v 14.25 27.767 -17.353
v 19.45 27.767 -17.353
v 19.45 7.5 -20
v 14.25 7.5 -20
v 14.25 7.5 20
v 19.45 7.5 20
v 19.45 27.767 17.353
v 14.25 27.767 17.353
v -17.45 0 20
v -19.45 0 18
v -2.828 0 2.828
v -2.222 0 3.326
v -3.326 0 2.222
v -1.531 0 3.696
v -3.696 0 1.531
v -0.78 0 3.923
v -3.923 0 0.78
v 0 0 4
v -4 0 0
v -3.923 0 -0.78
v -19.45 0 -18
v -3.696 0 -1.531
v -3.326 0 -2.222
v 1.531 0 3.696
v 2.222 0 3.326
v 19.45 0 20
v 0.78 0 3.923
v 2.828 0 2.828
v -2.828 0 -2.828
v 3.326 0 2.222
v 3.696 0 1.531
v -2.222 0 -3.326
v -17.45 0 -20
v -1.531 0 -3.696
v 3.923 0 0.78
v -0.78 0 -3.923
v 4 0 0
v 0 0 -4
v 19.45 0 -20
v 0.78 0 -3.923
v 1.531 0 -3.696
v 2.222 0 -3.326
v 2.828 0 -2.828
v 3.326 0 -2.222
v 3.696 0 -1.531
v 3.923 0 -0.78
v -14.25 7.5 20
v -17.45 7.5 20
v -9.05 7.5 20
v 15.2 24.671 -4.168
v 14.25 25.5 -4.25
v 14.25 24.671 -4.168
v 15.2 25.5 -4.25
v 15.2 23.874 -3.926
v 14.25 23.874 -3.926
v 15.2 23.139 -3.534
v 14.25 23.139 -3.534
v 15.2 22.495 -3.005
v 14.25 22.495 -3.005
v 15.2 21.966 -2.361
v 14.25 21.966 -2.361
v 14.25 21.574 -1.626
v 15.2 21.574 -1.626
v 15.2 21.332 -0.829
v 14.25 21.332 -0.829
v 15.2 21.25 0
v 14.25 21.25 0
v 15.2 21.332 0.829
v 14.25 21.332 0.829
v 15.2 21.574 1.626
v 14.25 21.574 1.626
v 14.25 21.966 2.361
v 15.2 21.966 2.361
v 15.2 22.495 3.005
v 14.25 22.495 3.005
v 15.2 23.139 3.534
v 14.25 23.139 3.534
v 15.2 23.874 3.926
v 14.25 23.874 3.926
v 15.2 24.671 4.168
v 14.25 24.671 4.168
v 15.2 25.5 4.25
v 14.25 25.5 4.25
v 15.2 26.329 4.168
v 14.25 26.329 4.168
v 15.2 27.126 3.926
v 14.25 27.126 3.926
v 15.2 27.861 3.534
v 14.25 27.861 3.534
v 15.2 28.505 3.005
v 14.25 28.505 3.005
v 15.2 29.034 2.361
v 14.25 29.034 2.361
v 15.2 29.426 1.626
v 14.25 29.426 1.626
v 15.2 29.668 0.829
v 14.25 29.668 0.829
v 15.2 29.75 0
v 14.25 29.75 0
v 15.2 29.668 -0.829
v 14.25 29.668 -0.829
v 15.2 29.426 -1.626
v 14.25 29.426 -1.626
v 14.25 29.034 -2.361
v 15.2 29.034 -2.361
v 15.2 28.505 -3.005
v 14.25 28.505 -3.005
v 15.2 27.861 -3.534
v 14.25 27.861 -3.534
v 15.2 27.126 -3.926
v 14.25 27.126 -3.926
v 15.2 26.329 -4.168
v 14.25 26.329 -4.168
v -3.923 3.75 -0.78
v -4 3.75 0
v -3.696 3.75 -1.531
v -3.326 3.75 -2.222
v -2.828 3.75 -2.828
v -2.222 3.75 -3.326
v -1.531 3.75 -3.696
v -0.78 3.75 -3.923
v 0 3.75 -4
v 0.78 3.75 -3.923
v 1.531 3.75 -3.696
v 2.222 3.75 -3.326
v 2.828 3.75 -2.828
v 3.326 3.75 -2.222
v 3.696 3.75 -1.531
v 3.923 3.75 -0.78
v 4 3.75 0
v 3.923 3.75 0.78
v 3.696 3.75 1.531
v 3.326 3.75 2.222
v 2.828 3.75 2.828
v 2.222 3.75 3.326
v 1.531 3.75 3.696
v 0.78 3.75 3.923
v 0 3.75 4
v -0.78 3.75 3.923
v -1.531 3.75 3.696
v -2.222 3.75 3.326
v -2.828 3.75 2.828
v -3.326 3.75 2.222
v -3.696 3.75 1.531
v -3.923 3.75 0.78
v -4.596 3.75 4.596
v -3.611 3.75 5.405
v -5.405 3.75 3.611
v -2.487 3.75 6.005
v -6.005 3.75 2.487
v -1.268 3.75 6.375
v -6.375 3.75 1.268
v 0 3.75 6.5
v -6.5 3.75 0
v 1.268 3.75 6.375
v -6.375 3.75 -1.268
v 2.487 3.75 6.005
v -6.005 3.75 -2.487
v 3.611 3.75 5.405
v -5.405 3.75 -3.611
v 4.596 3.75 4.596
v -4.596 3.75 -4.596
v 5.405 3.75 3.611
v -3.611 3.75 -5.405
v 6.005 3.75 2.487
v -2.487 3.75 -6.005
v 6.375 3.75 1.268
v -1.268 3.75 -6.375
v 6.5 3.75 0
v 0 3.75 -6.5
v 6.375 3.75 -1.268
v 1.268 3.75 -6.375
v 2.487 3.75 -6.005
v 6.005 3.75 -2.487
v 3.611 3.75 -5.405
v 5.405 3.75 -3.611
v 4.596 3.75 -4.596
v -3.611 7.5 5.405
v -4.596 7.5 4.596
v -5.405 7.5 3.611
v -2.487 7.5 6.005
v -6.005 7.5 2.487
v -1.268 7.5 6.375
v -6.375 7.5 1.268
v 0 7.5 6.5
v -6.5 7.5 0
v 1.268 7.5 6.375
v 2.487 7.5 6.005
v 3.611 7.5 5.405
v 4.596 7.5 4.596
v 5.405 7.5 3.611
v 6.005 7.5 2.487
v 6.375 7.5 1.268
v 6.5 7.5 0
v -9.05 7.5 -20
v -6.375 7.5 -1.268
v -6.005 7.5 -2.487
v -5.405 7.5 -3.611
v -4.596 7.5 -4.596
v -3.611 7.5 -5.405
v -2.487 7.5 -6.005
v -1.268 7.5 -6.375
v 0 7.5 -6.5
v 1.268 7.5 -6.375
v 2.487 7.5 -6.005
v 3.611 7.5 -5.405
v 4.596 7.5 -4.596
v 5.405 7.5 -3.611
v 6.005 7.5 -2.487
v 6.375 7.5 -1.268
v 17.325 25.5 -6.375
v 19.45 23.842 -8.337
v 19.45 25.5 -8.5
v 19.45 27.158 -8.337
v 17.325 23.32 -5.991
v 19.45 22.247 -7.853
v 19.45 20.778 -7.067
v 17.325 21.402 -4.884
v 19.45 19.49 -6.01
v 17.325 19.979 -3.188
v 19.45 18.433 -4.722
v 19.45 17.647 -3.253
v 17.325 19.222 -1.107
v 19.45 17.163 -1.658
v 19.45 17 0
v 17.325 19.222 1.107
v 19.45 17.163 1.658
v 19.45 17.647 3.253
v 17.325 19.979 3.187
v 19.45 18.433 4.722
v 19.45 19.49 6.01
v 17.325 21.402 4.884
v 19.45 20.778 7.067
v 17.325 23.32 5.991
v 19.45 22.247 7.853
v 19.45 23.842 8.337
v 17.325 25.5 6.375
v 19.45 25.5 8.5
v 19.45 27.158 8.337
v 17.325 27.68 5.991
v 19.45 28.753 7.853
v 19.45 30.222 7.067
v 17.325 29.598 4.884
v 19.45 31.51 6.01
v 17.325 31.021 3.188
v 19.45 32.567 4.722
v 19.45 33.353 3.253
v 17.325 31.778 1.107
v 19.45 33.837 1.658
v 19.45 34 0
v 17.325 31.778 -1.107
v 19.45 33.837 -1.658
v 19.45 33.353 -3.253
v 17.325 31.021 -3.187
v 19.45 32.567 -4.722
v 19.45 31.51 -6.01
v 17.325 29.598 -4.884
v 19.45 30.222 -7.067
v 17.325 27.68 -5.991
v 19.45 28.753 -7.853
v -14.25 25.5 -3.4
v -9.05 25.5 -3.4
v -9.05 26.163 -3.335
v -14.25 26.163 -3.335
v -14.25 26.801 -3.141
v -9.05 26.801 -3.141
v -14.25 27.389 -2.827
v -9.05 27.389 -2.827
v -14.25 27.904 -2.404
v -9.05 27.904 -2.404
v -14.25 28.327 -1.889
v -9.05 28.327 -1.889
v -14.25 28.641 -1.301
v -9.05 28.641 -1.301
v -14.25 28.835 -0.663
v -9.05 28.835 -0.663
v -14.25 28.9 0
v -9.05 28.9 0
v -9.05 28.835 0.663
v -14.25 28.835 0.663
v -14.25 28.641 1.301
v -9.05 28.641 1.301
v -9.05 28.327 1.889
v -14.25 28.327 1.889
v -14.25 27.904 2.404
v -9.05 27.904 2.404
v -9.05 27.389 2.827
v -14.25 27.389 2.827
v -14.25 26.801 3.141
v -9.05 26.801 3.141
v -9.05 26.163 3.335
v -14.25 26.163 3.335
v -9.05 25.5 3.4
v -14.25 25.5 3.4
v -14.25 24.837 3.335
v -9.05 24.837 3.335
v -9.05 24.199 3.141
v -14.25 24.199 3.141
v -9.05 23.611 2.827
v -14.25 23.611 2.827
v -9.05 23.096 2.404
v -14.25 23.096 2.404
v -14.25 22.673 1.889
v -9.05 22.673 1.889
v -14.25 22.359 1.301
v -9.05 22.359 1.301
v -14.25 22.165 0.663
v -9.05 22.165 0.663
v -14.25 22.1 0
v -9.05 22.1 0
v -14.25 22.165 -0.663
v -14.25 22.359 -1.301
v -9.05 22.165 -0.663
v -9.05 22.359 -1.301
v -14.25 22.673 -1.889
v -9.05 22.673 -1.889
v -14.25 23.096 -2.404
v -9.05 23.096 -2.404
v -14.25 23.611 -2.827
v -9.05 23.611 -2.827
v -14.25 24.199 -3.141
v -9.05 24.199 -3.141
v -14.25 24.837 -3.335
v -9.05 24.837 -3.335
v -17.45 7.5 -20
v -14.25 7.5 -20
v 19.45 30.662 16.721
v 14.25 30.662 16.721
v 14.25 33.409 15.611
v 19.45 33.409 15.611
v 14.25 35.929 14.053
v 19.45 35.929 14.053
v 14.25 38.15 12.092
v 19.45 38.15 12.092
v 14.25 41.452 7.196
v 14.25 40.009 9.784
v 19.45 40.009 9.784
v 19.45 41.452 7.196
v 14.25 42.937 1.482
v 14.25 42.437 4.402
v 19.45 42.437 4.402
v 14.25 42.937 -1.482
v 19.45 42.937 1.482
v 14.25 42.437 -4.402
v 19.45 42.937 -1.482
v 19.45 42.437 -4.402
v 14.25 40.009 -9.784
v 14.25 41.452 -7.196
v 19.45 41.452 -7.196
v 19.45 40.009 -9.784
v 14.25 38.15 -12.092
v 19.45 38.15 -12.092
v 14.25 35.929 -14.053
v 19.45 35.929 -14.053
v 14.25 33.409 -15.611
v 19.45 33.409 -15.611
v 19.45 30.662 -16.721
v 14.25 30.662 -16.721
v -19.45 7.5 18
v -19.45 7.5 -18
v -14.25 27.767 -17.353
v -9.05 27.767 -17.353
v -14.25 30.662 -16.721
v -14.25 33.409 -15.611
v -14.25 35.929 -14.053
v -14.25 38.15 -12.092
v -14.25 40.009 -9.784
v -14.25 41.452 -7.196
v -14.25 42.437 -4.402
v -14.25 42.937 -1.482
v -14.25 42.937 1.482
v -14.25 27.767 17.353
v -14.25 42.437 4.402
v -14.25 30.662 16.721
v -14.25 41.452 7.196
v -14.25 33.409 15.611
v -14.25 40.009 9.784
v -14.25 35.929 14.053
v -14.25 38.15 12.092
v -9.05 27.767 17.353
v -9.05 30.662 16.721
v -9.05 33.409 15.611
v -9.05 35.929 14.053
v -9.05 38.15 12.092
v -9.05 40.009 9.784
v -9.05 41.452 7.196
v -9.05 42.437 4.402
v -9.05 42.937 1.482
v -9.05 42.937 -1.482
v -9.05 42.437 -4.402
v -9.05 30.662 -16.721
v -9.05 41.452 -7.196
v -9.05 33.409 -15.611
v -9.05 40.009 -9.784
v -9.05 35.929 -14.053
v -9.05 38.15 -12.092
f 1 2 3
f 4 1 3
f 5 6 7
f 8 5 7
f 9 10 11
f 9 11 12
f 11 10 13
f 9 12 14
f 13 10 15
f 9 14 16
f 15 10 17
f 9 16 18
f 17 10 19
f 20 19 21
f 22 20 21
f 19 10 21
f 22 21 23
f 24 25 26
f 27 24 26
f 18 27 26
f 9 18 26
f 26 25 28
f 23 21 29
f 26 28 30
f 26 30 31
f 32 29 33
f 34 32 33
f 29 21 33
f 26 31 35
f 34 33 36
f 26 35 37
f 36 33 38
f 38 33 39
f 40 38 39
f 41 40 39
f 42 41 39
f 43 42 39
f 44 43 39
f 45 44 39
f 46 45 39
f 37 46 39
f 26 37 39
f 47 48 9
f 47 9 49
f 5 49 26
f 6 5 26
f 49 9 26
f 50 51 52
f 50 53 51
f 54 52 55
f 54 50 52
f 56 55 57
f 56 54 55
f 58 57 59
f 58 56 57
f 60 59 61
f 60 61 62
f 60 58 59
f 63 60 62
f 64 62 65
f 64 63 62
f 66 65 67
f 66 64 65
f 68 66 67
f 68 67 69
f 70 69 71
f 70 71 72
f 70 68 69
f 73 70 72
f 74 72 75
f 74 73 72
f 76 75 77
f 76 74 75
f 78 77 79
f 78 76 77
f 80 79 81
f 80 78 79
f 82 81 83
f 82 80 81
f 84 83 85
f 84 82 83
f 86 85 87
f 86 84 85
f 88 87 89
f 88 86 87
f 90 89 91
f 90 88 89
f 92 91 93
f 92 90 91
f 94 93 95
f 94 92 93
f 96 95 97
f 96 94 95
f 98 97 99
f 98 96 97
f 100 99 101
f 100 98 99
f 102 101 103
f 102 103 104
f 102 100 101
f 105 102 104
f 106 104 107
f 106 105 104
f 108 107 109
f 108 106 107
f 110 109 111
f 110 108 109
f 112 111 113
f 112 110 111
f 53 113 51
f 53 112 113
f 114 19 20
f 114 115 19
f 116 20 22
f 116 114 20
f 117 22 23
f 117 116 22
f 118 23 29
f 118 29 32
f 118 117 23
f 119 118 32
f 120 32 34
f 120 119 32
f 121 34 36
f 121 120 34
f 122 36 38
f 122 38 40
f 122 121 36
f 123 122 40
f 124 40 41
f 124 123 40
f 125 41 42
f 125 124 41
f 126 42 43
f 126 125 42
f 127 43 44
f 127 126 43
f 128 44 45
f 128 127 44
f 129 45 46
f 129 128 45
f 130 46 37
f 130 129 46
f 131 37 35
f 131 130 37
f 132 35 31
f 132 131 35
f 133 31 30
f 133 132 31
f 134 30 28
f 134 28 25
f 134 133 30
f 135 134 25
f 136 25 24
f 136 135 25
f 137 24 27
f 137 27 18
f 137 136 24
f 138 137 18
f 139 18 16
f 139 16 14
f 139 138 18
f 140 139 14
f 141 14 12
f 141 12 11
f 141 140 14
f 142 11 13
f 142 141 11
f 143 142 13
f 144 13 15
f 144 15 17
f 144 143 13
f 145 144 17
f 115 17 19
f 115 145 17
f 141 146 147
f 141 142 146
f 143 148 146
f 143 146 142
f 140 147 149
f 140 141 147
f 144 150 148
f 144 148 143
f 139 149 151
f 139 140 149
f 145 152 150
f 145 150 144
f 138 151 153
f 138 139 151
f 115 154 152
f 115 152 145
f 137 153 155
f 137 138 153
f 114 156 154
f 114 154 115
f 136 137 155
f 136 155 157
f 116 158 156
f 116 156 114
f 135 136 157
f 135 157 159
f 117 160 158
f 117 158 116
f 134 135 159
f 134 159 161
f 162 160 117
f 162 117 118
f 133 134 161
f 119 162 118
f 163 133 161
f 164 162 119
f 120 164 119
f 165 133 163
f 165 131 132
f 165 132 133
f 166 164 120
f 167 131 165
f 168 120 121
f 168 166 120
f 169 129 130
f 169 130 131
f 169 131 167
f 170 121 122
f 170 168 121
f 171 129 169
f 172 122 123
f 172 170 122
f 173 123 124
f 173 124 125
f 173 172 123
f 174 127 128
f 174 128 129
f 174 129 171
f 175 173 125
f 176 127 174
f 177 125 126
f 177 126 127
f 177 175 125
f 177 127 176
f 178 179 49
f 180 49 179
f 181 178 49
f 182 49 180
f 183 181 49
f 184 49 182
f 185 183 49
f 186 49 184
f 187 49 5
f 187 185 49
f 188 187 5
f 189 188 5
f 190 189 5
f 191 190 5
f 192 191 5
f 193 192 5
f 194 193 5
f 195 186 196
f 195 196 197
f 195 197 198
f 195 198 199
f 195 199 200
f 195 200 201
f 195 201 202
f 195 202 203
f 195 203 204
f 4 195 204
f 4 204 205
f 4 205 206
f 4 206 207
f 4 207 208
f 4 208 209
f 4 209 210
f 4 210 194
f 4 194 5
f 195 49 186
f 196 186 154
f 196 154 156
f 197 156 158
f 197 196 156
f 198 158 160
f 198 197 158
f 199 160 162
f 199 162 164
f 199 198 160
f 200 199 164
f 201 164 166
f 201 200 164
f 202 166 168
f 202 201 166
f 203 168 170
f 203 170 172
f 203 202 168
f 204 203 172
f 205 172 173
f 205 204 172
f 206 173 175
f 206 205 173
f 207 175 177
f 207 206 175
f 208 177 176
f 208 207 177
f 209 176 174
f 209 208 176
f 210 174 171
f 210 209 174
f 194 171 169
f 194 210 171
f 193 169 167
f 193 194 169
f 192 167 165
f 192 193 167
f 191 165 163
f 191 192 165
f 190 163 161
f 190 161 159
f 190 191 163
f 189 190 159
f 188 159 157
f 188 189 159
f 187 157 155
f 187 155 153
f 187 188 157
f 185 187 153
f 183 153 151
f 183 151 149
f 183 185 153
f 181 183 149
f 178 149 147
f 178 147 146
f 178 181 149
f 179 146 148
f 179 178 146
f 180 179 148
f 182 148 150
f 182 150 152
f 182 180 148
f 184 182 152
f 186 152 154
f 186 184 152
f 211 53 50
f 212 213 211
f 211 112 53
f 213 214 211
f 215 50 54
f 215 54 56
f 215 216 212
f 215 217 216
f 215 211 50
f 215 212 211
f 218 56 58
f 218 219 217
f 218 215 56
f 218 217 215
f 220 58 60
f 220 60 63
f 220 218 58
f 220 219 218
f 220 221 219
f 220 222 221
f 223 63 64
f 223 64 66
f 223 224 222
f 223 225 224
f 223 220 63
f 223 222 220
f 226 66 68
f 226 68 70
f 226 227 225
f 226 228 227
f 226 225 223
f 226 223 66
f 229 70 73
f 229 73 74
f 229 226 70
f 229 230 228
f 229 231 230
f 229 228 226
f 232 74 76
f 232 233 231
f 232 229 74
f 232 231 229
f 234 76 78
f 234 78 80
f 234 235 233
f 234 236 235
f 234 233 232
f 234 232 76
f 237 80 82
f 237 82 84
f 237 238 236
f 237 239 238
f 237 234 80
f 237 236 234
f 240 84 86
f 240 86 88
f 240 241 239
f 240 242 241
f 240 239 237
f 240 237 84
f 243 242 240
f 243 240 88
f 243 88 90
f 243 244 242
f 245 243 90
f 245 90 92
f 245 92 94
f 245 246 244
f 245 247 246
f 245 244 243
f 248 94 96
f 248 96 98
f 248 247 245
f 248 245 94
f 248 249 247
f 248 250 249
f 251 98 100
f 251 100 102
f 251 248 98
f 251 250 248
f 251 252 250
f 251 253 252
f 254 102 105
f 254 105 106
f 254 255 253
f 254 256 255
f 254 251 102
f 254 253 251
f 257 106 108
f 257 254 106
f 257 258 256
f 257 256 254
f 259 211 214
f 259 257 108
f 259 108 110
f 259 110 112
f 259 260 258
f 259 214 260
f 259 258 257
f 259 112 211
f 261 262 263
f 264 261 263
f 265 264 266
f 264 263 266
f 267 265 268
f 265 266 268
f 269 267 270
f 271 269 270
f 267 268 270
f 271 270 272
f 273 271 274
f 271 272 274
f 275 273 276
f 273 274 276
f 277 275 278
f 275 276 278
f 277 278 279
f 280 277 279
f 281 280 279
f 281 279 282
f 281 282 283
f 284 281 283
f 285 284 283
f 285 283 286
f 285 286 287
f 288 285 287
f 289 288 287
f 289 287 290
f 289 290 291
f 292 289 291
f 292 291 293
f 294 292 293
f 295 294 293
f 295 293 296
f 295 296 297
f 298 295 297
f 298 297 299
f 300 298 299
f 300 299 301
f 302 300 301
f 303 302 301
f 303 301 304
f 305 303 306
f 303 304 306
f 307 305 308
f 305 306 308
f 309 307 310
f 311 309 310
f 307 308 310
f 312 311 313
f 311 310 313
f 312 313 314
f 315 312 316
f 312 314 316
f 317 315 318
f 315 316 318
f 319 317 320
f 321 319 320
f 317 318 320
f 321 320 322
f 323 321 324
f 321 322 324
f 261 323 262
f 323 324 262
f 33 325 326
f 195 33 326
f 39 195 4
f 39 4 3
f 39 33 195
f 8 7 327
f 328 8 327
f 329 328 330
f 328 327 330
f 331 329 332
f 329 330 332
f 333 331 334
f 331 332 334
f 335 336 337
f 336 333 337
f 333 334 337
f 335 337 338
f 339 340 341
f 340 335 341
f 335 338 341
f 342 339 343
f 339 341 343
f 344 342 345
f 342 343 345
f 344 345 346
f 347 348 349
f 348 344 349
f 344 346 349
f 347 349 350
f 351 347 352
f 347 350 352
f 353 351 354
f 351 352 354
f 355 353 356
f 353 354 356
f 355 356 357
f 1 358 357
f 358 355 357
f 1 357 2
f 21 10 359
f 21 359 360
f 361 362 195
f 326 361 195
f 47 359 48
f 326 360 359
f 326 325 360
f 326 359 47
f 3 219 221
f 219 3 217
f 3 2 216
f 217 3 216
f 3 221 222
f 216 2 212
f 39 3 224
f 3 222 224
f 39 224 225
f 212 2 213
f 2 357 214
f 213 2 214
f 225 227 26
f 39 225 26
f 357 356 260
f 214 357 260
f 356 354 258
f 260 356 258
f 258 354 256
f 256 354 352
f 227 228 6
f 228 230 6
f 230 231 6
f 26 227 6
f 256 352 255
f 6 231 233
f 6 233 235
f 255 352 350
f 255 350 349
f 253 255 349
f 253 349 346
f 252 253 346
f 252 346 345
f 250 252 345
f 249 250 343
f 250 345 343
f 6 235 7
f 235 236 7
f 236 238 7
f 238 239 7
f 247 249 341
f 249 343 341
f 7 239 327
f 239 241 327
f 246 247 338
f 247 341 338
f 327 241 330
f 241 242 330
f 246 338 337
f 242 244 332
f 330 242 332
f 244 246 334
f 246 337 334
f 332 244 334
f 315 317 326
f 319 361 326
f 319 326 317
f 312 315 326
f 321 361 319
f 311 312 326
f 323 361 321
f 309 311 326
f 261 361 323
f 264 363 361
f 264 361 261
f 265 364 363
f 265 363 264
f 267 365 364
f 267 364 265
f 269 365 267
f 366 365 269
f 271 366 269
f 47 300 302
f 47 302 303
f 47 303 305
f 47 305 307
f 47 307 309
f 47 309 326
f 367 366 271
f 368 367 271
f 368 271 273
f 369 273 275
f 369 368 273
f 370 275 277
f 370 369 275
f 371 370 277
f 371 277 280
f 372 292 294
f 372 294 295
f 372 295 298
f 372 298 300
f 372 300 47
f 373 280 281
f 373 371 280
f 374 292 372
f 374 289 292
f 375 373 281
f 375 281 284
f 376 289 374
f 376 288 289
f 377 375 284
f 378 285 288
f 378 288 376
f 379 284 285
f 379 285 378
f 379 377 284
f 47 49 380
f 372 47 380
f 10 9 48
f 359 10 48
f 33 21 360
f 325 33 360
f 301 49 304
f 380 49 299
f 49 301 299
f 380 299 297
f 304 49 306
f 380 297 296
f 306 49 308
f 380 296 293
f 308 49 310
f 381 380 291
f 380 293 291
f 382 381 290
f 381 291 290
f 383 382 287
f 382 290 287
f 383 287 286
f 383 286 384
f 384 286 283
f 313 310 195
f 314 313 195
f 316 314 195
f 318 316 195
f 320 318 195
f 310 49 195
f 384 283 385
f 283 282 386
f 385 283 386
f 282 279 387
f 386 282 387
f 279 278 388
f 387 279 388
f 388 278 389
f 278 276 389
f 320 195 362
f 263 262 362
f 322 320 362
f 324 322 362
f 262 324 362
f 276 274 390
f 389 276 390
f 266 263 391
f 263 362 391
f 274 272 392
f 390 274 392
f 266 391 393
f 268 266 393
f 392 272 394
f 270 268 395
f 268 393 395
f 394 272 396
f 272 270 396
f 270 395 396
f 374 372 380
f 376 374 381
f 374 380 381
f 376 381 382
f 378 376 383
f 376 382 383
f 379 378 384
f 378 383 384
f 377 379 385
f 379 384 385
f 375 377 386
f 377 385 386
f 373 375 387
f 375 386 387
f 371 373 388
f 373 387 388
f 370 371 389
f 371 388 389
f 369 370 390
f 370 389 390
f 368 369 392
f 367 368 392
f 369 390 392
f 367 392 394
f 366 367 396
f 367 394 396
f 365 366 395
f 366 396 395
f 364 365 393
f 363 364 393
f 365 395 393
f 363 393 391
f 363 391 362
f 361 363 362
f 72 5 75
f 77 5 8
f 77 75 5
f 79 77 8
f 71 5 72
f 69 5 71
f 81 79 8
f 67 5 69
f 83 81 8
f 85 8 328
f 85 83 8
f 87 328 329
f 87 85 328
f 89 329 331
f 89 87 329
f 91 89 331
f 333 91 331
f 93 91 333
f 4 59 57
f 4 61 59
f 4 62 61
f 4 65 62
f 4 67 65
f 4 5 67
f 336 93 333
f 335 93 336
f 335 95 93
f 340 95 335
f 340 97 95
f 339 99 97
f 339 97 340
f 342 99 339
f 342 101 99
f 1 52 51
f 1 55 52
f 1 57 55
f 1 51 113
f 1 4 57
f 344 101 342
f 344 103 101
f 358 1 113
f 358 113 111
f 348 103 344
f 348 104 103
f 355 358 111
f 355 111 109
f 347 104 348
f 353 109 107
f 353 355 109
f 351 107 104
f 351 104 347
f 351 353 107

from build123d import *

# Parameters (mm, degrees)
SKETCH_1_W               = 38.9
SKETCH_1_H               = 40
EXTRUDE_1_DEPTH          = 7.5
EXTRUDE_2_DEPTH          = 33.7
SKETCH_4_W               = 23.3
SKETCH_4_H               = 35.5
CUT_EXTRUDE_1_DEPTH      = 21
CUT_EXTRUDE_1_DEPTH_BACK = 21
CHAMFER_1_SIZE           = 2
HOLE_WIZARD_M81_D        = 6.8
HOLE_WIZARD_M81_DEPTH    = 5.2


with BuildPart() as part:
    # Эскиз1 → Бобышка-Вытянуть1 (new body)
    with BuildSketch(Plane(origin=(0, 0, 0), x_dir=(1, 0, 0), z_dir=(0, 1, 0))):
        Rectangle(SKETCH_1_W, SKETCH_1_H)
    extrude(amount=EXTRUDE_1_DEPTH)

    # Эскиз2 → Вырез-Повернуть1 (revolve, cut)
    with BuildSketch(Plane.XY):
        Polygon((-4, 0), (-4, 3.75), (-6.5, 3.75), (-6.5, 7.5), (0, 7.5), (0, 0), align=None)
    revolve(axis=Axis((0, 7.5, 0), (0, -1, 0)), mode=Mode.SUBTRACT)

    # Эскиз3 → Бобышка-Вытянуть2 (add)
    with BuildSketch(Plane(origin=(19.45, 0, 0), x_dir=(0, 0, -1), z_dir=(1, 0, 0))):
        with BuildLine():
            Line((-20, 7.5), (-17.35257463, 27.766749589))
            ThreePointArc((-17.35257463, 27.766749589), (0, 43), (17.35257463, 27.766749589))
            Line((17.35257463, 27.766749589), (20, 7.5))
            Line((20, 7.5), (-20, 7.5))
        make_face()
    extrude(amount=-EXTRUDE_2_DEPTH)

    # Эскиз4 → Вырез-Вытянуть1 (cut, two sides)
    with BuildSketch(Plane.XY) as cut_extrude_1_sk:
        with Locations((2.6, 25.25)):
            Rectangle(SKETCH_4_W, SKETCH_4_H)
    extrude(amount=CUT_EXTRUDE_1_DEPTH, mode=Mode.SUBTRACT)
    extrude(cut_extrude_1_sk.sketch, amount=-CUT_EXTRUDE_1_DEPTH_BACK, mode=Mode.SUBTRACT)

    # Фаска1
    chamfer_1_edges = [part.edges().sort_by_distance(p)[0] for p in [
        (-19.45, 3.75, -20),
        (-19.45, 3.75, 20),
    ]]
    chamfer(chamfer_1_edges, length=CHAMFER_1_SIZE)

    # Эскиз10 → Зенковка для винта с полупотайной головкой 1 (revolve, cut)
    with BuildSketch(Plane(origin=(19.45, 25.5, 0), x_dir=(0, 0, -1), z_dir=(0, 1, 0))):
        Polygon((0, 0), (0, 5.2), (4.25, 5.2), (4.25, 4.25), (8.5, 0), align=None)
    revolve(axis=Axis((25.8, 25.5, 0), (-1, 0, 0)), mode=Mode.SUBTRACT)

    # Отверстие обработанное метчиком M81
    with Locations(Plane.ZY.offset(14.25)):
        with Locations((0, 25.5)):
            Hole(HOLE_WIZARD_M81_D / 2, depth=HOLE_WIZARD_M81_DEPTH)


solid = part.part
